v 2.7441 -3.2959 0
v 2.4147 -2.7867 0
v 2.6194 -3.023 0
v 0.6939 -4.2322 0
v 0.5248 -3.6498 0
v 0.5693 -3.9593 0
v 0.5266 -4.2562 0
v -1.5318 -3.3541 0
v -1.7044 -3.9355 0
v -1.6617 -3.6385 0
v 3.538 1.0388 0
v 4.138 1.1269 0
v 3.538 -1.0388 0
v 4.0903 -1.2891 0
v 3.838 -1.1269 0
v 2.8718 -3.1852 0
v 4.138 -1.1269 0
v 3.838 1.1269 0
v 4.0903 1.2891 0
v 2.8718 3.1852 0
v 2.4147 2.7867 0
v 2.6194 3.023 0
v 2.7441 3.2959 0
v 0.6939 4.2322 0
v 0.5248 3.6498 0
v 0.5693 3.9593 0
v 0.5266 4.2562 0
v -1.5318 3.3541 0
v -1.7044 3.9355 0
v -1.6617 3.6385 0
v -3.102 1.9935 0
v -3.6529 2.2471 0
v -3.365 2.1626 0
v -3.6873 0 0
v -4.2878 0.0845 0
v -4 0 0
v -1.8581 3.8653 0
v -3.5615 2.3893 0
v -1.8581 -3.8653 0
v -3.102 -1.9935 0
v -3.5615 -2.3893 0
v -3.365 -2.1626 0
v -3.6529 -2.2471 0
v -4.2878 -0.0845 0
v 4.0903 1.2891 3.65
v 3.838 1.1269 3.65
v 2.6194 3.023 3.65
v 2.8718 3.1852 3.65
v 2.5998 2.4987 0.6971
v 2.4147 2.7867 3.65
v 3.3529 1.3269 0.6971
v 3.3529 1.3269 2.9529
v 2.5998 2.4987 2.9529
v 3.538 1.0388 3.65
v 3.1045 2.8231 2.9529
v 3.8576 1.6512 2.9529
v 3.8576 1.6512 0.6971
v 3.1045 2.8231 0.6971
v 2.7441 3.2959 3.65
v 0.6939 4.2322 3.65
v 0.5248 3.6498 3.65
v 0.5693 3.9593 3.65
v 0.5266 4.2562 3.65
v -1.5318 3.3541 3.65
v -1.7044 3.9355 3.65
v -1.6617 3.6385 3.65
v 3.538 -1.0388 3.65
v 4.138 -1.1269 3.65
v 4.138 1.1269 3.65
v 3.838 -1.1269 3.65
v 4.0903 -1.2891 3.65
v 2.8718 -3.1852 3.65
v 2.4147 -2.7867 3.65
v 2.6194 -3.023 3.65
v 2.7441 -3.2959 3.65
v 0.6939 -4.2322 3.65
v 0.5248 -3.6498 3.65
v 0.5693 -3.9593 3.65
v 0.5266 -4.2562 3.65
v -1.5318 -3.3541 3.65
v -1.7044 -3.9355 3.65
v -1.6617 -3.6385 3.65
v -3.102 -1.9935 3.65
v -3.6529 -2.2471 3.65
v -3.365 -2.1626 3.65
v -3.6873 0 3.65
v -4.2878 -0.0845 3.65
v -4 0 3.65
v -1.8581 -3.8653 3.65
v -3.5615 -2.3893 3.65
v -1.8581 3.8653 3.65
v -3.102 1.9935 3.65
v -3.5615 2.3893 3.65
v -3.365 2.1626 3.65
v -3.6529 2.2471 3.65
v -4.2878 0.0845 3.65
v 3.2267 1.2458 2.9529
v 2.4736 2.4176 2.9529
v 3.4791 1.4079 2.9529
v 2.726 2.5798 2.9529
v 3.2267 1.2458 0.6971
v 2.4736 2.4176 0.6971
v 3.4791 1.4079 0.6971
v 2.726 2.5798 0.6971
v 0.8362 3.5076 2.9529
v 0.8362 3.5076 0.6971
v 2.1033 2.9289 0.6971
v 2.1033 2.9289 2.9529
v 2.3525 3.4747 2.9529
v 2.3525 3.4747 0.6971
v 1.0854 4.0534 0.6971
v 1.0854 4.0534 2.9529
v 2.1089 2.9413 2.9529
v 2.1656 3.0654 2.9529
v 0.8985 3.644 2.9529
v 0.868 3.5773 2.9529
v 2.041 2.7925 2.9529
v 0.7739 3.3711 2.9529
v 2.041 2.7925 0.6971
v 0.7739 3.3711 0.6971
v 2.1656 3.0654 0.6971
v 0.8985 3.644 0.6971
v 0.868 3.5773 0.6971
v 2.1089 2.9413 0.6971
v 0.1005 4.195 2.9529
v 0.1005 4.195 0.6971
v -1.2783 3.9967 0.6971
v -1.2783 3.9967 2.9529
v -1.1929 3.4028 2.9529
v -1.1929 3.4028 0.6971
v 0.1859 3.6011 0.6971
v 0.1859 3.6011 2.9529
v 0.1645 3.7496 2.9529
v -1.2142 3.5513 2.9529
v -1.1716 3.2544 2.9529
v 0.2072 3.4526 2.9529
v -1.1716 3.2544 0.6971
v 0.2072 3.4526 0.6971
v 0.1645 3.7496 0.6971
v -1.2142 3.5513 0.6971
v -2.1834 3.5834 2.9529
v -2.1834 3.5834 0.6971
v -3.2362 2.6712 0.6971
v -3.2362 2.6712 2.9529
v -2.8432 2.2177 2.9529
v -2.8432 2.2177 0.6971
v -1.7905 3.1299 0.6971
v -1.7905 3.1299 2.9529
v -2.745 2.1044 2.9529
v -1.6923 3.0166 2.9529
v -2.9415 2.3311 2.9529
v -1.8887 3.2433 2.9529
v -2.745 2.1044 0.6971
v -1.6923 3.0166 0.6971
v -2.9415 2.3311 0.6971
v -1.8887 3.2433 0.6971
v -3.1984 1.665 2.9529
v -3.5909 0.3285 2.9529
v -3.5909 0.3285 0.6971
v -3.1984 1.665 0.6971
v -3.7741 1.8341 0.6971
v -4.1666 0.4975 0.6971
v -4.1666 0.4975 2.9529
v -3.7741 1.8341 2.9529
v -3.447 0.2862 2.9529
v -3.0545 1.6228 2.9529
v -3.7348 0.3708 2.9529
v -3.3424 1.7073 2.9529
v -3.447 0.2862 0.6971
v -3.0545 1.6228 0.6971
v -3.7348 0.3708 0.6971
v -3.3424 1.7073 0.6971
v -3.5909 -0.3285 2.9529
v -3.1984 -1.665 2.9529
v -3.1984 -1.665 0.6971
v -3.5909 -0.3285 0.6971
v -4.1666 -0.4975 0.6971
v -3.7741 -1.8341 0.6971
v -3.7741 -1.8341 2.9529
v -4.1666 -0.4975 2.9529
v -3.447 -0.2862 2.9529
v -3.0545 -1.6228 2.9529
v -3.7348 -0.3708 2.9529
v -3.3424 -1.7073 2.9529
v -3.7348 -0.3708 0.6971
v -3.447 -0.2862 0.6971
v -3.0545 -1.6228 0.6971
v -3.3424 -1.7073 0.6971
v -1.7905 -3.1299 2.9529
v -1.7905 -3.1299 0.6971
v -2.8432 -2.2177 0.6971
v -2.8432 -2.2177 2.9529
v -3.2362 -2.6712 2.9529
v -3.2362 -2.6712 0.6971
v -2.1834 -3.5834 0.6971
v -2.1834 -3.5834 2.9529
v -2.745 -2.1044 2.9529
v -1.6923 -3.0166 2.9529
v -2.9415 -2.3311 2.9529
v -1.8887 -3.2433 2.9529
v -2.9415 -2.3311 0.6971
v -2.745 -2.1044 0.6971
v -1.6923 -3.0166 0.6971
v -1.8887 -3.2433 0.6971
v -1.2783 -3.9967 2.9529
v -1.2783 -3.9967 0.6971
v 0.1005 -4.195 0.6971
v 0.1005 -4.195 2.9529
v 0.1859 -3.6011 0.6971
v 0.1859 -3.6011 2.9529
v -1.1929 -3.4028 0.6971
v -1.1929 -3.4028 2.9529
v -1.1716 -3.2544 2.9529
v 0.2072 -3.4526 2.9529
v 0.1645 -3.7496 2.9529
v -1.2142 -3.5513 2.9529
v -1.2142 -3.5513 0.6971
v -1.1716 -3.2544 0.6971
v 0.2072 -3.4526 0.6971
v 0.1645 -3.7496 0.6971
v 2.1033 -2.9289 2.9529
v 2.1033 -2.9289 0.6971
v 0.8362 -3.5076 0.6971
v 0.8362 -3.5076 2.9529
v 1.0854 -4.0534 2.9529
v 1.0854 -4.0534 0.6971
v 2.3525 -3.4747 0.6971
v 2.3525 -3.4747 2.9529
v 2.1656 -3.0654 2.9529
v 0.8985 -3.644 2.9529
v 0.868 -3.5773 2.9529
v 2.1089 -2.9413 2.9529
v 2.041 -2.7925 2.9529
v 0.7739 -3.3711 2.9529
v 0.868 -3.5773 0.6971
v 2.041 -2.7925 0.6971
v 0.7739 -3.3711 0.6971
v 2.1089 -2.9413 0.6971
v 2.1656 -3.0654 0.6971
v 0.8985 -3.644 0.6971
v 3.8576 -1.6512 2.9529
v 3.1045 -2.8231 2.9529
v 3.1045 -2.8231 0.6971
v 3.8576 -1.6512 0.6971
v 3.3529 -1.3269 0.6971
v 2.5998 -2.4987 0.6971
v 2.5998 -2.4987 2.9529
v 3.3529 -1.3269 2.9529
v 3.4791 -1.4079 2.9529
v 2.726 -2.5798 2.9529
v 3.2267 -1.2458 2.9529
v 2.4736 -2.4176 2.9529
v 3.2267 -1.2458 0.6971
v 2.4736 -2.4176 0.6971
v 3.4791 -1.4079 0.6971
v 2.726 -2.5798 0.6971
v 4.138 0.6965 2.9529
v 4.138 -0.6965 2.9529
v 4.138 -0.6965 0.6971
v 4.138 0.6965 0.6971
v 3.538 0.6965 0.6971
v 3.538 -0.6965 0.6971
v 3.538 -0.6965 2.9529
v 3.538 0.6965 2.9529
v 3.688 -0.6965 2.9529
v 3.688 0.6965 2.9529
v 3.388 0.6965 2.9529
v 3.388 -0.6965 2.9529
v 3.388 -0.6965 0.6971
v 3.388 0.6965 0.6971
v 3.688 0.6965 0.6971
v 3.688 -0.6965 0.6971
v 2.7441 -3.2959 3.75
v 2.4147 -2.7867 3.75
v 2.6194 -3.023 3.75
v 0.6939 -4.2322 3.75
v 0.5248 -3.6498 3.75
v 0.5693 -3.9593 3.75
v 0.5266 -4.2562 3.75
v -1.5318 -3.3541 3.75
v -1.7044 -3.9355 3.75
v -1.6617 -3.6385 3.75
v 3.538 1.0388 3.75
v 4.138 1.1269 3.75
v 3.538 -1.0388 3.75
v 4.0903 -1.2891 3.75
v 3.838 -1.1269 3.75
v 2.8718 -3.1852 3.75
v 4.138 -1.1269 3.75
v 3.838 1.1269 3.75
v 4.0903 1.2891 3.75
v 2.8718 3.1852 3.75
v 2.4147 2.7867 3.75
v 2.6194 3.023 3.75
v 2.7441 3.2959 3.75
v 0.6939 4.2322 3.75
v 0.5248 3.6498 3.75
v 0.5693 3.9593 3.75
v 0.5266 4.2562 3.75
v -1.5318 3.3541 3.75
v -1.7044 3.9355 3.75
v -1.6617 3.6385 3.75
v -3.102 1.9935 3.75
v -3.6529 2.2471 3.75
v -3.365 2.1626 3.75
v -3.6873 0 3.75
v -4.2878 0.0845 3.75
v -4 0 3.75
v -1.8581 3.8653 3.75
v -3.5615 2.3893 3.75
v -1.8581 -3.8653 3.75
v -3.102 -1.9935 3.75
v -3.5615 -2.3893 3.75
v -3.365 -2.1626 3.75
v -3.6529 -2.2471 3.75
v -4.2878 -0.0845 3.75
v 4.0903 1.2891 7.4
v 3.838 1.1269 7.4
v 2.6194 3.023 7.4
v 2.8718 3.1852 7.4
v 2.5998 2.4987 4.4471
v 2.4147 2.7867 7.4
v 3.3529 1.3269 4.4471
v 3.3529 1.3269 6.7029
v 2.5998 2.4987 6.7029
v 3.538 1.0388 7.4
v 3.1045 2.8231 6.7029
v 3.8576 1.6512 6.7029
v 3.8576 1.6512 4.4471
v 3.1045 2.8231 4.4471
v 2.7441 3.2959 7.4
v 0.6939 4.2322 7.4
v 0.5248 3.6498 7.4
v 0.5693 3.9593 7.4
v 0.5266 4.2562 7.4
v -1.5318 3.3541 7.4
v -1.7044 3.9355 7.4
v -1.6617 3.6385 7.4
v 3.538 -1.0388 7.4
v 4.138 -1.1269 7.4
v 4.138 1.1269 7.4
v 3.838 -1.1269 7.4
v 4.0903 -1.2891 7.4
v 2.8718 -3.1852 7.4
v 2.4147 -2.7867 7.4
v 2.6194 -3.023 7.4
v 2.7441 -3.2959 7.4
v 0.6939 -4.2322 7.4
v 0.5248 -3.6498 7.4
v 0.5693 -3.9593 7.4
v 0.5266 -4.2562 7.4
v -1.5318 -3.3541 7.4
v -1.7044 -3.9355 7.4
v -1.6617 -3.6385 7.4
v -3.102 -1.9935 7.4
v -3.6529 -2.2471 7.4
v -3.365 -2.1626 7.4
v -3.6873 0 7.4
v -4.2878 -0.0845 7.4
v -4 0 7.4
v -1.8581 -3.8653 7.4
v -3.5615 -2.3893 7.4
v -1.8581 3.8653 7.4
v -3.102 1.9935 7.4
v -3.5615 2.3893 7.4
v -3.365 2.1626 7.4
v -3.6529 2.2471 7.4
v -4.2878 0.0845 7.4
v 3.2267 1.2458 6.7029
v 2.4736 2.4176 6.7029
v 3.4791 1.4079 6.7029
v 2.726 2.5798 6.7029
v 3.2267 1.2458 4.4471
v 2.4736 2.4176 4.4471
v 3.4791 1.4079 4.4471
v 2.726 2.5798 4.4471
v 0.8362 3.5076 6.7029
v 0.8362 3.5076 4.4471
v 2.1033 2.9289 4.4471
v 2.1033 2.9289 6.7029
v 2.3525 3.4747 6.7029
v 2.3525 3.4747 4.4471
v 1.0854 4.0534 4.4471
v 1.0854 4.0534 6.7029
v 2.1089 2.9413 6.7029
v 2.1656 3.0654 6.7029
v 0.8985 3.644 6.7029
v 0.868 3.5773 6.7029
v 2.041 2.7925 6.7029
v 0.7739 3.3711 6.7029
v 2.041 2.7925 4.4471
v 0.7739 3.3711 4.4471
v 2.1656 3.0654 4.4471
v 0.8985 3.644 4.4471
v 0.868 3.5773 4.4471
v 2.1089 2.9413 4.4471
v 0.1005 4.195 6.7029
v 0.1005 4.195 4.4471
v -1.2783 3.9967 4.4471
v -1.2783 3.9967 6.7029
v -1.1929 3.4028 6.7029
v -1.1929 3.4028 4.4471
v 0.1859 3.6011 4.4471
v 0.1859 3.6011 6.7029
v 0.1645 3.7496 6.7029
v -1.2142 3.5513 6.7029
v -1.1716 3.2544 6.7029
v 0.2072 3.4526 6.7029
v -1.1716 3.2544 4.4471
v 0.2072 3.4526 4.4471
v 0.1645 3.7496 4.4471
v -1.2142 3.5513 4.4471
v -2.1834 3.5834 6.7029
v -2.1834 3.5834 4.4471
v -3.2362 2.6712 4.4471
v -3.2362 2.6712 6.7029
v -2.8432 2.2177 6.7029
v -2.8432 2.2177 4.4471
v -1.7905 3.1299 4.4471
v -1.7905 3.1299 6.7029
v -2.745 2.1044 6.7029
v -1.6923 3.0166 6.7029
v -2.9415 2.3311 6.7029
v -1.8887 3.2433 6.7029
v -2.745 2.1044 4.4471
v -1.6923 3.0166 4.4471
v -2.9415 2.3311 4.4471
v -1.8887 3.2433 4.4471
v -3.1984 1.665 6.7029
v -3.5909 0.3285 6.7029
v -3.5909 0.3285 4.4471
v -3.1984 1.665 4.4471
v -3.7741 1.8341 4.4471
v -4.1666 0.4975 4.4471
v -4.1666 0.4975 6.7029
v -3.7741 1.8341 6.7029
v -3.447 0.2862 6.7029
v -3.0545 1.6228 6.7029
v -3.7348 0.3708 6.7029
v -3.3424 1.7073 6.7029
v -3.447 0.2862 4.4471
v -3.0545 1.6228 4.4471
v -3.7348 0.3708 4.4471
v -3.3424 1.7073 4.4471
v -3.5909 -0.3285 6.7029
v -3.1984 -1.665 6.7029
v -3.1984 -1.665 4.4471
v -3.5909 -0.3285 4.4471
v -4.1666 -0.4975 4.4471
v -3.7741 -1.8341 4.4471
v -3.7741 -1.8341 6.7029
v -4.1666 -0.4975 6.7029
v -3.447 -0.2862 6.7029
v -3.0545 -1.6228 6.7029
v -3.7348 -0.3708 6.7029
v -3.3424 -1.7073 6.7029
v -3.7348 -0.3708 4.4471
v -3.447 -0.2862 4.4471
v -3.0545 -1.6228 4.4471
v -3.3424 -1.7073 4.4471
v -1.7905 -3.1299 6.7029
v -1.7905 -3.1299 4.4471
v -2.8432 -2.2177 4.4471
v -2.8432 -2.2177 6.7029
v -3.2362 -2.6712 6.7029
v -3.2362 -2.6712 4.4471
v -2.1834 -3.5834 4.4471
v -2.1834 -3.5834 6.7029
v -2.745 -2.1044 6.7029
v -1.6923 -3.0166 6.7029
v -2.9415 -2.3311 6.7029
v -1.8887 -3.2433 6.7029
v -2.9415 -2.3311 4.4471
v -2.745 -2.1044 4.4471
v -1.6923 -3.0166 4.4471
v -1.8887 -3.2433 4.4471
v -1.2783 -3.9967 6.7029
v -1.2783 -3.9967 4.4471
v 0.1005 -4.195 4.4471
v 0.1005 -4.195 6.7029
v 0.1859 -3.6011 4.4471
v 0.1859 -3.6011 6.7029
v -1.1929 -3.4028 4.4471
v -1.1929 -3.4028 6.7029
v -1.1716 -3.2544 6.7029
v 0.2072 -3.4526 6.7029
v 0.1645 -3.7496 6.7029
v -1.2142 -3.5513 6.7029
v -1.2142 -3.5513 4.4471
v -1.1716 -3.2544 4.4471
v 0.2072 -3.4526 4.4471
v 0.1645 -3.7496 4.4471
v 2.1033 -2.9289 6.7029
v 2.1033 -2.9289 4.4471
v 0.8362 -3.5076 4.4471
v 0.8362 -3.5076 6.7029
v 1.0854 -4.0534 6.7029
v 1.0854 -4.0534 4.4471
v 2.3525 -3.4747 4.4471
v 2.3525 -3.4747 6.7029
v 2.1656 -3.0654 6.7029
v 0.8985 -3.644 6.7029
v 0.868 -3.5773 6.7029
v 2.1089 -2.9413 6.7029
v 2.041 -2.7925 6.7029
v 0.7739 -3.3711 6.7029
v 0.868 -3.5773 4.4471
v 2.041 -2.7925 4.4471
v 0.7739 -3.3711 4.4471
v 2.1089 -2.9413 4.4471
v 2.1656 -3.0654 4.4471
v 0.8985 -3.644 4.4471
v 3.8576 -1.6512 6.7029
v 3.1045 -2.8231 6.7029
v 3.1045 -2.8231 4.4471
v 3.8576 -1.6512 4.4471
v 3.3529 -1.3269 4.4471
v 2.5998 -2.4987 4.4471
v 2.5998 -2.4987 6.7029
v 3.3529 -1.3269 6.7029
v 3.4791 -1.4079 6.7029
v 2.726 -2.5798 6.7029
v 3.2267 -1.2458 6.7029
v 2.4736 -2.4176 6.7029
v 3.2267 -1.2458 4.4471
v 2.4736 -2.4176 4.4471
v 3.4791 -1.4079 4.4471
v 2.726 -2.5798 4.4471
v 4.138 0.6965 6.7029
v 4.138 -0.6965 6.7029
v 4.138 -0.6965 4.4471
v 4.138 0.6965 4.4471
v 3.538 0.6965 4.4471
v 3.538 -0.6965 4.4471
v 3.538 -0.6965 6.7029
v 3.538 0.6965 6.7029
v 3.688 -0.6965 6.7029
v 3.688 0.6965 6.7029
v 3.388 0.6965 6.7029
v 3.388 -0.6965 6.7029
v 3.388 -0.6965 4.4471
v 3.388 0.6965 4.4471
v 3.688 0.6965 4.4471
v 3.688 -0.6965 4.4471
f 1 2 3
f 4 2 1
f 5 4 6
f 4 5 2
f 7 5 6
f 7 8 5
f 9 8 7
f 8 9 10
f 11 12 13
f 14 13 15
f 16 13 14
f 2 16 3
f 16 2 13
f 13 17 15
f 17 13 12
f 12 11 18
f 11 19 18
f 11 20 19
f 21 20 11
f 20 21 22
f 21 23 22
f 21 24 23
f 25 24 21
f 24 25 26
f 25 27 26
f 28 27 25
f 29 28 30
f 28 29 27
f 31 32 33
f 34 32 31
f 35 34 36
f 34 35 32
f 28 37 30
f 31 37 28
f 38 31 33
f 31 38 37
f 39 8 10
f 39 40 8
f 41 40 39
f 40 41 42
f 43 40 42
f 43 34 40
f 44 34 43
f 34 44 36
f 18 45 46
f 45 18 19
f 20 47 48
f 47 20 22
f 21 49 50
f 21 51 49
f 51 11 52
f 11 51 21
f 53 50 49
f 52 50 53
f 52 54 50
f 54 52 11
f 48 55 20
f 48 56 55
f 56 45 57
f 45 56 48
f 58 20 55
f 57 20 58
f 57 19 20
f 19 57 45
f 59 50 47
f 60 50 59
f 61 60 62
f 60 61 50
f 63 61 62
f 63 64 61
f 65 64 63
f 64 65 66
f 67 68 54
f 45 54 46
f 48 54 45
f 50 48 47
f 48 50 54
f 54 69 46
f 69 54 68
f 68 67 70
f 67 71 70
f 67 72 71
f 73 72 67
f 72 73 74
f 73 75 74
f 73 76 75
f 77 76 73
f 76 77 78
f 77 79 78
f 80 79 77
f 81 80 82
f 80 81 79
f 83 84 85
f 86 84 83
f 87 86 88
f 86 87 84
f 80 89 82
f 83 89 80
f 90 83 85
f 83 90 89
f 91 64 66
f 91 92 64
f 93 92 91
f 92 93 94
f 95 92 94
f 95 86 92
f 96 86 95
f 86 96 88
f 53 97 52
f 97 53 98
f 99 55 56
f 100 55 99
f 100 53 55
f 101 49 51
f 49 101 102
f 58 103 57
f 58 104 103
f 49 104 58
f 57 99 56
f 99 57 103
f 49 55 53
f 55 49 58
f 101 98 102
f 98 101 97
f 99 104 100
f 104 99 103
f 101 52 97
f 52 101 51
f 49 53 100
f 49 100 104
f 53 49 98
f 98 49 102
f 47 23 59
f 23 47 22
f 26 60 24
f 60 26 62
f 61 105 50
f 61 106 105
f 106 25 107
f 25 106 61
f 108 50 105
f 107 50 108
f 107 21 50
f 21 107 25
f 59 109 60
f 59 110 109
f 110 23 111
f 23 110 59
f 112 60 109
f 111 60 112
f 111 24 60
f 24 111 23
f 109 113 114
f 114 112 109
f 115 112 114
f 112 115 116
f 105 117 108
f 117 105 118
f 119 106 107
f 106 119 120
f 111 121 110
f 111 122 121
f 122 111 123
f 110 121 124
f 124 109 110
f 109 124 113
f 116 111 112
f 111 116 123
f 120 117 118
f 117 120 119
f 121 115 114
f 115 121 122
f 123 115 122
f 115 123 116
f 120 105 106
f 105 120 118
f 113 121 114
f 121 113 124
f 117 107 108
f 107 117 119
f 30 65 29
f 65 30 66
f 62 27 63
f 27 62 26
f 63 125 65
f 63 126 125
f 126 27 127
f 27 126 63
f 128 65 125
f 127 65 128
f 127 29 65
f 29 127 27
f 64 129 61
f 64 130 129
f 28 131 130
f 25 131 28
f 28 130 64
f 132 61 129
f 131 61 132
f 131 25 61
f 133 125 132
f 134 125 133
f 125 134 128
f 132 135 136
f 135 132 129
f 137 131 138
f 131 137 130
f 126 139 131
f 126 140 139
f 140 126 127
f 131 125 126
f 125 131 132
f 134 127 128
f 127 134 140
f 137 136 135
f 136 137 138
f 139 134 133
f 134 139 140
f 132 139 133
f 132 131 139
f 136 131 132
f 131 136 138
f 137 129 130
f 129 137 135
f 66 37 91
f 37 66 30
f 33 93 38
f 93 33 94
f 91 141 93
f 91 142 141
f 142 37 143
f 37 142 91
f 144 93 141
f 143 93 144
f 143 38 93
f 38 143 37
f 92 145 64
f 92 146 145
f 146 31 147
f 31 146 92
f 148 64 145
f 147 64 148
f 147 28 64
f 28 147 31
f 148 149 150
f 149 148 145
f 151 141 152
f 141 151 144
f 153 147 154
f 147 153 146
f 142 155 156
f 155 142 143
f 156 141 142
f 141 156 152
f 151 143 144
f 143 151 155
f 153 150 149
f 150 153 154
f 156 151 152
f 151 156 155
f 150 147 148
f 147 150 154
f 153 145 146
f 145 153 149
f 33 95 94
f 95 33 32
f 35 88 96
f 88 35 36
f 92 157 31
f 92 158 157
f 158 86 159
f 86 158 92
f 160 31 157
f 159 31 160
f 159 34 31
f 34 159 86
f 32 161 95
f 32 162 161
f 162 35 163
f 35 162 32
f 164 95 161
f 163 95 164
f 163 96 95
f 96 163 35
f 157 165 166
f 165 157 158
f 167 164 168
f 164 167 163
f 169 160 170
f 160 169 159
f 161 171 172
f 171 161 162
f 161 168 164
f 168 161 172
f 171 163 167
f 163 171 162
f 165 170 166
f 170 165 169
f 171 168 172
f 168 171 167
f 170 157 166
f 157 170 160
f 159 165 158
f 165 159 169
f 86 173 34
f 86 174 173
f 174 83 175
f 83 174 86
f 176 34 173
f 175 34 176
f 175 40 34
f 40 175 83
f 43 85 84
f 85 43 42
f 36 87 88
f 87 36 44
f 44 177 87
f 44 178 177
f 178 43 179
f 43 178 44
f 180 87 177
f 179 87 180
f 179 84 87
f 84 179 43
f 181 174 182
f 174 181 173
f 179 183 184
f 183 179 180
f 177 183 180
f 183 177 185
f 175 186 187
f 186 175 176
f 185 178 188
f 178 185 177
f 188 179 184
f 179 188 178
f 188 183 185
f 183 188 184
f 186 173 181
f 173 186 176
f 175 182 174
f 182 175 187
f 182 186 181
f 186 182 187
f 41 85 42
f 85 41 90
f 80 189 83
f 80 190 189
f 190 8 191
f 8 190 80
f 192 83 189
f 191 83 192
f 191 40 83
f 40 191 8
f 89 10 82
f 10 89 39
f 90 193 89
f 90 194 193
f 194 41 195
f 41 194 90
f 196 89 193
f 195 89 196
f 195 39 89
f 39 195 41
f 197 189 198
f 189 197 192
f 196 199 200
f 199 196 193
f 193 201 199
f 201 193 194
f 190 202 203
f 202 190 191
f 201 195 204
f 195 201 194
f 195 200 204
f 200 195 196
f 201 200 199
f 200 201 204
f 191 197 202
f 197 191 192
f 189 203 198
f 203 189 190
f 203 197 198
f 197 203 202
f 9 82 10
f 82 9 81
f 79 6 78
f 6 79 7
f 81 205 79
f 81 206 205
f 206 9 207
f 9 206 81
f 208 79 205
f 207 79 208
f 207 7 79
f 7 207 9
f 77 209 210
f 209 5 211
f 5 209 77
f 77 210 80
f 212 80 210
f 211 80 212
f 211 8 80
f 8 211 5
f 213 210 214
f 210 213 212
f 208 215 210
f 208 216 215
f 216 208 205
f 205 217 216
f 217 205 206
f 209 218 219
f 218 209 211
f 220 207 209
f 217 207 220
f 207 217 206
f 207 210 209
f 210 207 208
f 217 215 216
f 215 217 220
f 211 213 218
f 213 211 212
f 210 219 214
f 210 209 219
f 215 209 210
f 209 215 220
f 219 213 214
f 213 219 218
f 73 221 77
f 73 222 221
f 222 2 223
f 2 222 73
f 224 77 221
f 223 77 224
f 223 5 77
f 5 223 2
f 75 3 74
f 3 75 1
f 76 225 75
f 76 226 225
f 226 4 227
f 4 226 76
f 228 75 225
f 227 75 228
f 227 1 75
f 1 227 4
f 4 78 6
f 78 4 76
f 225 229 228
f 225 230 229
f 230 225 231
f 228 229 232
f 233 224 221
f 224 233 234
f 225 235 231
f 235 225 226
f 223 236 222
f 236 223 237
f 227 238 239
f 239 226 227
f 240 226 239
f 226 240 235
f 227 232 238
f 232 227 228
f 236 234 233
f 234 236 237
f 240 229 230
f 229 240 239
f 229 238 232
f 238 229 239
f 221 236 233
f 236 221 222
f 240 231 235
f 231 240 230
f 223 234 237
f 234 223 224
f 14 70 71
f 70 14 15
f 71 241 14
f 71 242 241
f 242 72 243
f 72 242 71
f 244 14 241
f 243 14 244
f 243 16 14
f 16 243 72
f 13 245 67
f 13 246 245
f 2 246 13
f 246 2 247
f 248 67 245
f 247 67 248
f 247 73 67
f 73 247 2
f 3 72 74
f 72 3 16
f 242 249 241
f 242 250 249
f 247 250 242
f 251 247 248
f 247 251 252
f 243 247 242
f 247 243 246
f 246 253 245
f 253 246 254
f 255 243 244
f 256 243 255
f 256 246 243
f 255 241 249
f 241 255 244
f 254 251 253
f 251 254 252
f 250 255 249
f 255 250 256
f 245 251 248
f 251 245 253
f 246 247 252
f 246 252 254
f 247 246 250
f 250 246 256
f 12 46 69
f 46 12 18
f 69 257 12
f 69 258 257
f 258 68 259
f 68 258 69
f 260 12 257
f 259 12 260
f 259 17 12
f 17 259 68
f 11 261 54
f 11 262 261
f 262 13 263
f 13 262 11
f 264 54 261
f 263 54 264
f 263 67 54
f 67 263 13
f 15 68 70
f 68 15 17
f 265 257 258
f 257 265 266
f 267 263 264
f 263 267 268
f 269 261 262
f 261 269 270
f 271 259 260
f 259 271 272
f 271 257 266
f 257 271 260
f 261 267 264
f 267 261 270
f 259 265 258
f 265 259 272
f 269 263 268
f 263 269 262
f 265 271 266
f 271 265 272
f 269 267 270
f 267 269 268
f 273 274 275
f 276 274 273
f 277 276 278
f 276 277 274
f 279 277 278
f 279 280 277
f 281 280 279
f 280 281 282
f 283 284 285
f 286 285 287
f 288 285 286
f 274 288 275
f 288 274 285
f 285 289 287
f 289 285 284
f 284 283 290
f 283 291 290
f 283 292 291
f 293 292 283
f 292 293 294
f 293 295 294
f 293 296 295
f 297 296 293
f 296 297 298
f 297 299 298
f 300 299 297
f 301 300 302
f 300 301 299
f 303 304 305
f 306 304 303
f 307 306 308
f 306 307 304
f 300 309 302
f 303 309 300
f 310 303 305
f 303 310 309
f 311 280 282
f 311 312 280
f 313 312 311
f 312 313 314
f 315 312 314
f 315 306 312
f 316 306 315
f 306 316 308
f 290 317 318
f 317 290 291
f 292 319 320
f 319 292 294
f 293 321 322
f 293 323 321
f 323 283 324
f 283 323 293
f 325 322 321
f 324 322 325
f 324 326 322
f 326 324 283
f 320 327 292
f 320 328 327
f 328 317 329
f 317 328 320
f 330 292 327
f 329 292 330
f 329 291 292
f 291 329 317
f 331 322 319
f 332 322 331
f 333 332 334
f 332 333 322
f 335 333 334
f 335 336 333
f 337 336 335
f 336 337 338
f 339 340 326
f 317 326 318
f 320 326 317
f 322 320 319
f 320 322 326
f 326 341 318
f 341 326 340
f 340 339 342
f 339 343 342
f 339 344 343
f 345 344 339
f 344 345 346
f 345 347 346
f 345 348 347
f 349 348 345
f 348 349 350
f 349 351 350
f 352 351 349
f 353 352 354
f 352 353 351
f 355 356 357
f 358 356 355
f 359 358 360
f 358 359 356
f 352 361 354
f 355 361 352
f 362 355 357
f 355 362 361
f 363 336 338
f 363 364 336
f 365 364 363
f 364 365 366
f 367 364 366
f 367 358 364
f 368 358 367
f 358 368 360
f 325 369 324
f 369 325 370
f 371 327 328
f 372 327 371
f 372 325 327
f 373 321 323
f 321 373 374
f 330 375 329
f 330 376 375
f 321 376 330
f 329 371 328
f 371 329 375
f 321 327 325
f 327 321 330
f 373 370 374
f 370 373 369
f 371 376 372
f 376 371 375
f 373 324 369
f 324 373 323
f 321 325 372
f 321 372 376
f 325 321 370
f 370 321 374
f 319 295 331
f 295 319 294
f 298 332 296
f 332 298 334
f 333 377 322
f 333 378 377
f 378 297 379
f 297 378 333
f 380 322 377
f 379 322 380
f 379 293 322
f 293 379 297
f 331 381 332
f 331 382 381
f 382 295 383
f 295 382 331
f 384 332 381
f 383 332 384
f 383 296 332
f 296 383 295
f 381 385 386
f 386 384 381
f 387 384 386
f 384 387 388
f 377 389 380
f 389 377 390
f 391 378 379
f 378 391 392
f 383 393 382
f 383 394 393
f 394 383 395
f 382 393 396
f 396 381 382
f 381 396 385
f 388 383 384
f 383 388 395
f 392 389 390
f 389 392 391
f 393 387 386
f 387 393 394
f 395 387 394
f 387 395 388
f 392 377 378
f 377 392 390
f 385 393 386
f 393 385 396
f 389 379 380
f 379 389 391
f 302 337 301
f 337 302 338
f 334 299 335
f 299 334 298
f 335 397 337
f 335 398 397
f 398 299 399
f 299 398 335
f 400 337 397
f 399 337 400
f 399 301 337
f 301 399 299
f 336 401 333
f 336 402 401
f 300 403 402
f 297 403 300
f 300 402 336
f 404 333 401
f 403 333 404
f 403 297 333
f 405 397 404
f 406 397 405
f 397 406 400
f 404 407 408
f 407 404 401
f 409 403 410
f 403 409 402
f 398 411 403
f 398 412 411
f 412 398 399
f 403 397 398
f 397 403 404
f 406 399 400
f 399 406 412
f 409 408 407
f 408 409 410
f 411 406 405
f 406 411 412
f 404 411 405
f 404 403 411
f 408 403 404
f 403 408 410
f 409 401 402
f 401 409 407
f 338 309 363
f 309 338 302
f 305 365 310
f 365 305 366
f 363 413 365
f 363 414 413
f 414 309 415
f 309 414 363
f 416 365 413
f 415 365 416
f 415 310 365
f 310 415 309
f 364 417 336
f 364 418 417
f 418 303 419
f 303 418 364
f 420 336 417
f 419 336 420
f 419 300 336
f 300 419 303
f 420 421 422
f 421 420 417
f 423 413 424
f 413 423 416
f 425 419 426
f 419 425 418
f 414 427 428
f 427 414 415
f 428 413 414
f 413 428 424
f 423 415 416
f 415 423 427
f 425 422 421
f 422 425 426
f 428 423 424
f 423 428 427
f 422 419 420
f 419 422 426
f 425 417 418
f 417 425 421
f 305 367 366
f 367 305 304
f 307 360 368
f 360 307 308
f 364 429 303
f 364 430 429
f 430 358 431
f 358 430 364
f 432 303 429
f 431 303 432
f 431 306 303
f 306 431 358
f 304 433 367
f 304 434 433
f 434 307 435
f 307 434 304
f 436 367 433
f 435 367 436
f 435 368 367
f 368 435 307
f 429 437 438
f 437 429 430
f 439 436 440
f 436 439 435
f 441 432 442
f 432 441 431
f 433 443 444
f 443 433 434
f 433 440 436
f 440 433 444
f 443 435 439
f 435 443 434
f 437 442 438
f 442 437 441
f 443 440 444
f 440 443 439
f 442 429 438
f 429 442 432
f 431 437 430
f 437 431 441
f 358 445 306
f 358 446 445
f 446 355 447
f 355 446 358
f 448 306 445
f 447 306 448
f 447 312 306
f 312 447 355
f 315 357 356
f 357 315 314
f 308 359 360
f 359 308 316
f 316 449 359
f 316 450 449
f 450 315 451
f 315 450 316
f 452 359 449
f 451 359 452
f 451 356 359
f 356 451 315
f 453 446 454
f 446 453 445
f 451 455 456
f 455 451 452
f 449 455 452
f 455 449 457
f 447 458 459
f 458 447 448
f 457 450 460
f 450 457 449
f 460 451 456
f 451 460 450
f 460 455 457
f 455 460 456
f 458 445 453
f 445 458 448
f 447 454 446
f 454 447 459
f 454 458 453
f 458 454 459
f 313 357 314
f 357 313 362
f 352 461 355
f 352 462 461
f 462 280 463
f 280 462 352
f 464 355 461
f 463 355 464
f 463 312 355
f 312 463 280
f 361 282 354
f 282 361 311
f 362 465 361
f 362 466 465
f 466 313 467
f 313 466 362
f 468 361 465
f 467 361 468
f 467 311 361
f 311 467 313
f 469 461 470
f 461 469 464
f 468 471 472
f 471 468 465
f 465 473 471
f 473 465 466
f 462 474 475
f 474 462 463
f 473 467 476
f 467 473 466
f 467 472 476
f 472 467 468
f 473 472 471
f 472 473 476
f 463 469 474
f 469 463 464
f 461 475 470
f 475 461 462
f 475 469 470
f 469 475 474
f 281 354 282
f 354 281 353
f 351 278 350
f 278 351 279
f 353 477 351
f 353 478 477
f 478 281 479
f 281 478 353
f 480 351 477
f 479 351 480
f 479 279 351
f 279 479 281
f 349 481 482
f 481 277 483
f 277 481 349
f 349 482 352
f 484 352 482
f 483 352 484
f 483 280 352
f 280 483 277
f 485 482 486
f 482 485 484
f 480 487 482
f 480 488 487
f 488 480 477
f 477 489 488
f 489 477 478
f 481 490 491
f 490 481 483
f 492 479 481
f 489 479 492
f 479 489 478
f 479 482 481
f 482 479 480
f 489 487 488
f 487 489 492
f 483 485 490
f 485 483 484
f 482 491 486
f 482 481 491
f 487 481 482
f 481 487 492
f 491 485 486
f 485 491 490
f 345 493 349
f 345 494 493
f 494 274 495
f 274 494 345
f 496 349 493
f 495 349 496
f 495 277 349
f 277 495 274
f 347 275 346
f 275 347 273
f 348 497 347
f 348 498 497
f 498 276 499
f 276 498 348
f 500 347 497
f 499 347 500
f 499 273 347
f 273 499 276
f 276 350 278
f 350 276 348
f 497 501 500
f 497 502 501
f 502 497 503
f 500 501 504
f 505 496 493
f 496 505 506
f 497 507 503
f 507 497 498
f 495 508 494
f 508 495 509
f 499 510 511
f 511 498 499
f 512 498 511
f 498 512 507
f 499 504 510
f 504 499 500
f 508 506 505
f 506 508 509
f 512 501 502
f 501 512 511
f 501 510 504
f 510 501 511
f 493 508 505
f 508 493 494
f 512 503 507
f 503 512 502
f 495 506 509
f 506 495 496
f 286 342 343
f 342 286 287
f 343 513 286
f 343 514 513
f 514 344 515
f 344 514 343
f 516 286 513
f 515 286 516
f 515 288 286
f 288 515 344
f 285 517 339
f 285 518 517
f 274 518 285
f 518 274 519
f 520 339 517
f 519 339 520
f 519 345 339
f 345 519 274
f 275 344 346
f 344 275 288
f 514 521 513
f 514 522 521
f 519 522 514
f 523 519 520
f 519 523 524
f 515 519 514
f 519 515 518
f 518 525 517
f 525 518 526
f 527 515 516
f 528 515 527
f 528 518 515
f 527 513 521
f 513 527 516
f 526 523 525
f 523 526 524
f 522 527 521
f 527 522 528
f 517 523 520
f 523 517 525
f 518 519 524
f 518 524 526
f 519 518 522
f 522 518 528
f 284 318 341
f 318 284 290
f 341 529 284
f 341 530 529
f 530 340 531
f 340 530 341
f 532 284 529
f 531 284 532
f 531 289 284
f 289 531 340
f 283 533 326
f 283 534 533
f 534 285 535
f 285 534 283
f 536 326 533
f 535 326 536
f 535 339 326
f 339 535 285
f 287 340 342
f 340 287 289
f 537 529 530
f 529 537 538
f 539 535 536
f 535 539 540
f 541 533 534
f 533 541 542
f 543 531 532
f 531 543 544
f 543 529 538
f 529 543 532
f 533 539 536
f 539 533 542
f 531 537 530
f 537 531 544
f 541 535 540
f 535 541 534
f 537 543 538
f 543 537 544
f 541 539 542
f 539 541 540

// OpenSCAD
// file: lib/element.scad
// constants
gr = 1.61803; // golden ration

function inbetween(p1, p2, procent = 50) =
    let (x_diff = p2[0] - p1[0])
    let (y_diff = p2[1] - p1[1])
    [ p1[0] + x_diff*procent/100
    , p1[1] + y_diff*procent/100
    ];

function h(p2d, h) =
    [p2d[0], p2d[1], h];

// create a wall
module wall(p1, p2, h, thickness = 300) {
    let (x_diff = p2[0] - p1[0])
    let (y_diff = p2[1] - p1[1])
    let (len = sqrt(pow(x_diff, 2) +
                    pow(y_diff, 2)))
    if (h != 0)
    {
        linear_extrude(height = h)
        translate(p1)
        rotate(atan2(y_diff, x_diff))
        translate([0, -thickness/2])
        square([len, thickness]);
    }
    else
    {
        translate(p1)
        rotate(atan2(y_diff, x_diff))
        translate([0, -thickness/2])
        square([len, thickness]);
    }
}

// create a wall with two different heights
module wall2(p1, p2, h1, h2, thickness = 0.5) {
    let (x_diff = p2[0] - p1[0])
    let (y_diff = p2[1] - p1[1])
    let (len = sqrt(pow(x_diff, 2) +
                    pow(y_diff, 2)))
    if ((h1 == 0)&&(h2 == 0))
    {
        wall(p1, p2, 0, thickness);
    }
    else
    {
        translate(p1)
        rotate(atan2(y_diff, x_diff))
        rotate([90, 0, 0])
        linear_extrude(height = thickness, center = true)
        polygon(points=[[0,0],[len,0],[len,h2],[0,h1]]);
    }
}

module window(p1, p2, pos, height, sizex, sizey, wt = 300) {
    assert(0 < pos && pos < 100);
    x_diff = p2[0] - p1[0];
    y_diff = p2[1] - p1[1];
    len = sqrt(pow(x_diff, 2) +
               pow(y_diff, 2));
    difference () {
        children();
        // create the hole for the window
        translate([0,0,height])
        translate(p1 + pos*[x_diff, y_diff]/100)
        rotate(atan2(y_diff, x_diff) + 90, [0,0,1])
        cube([4*wt, sizex, sizey], center = true);
    }
    // add the glass to the window
    color_glass()
    translate([0,0,height])
    translate(p1 + pos*[x_diff, y_diff]/100)
    rotate(atan2(y_diff, x_diff) + 90, [0,0,1])
    translate([wt/2, 0, 0])
    cube([wt/2, sizex, sizey], center = true);
}

module plane(p1, p2, p3, p4, th = 0.000002) {
    v1 = [ p2[0] - p1[0]
         , p2[1] - p1[1]
         , p2[2] - p1[2]
         ];
    v2 = [ p2[0] - p3[0]
         , p2[1] - p3[1]
         , p2[2] - p3[2]
         ];
    hull()
        for(p=[p1, p2, p3, p4])
            translate(p) cube(th, true);
}

module beam(p1, p2, r = 0.4) {
    vector = [ p2[0] - p1[0]
             , p2[1] - p1[1]
             , p2[2] - p1[2]
             ];
    distance = norm(vector);
    translate(vector/2 + p1)
    rotate([0, 0, atan2(vector[1], vector[0])]) // rotationXY
    rotate([0, atan2(sqrt(pow(vector[0], 2) + pow(vector[1], 2)), vector[2]), 0]) // rotationZX
    cylinder(h = distance, r = r, $fn = 20, center = true);
}

module plinth(p, s, h) {
    translate([p[0], p[1], h/2])
    cube([s, s, h], center = true);
}

module color_lawn() {
    color("LawnGreen")
    children();
}

module color_outer_wall() {
    color("MediumSpringGreen")
    children();
}

module color_inner_wall() {
    color("Ivory")
    children();
}

module color_roof() {
    color("Lavender")
    children();
}

module color_floor() {
    color("Wheat")
    children();
}

module color_logs() {
    color("Ivory")
    children();
}

module color_glass() {
    color("azure", 0.50)
    children();
}

module color_concrete() {
    color("lightgrey")
    children();
}

// Regular polygons

// calculate the coordinates for the corners
function point(i, r, corners) =
   let (vz = 360/corners/2)
   let (angle=i*(360/corners) - vz)
   [ r*cos(angle)
   , r*sin(angle)
   ];

module octagon(r, h, corners) {
    coords=[for (i = [0:corners-1]) point(i, r, corners)];
    linear_extrude(height = h)
    polygon(coords);
}

module octawalls(r, h, wt, corners) {
    difference () {
        octagon(r, h, corners);
        translate([0, 0, -wt])
        octagon(r - wt, h + 2*wt, corners);
    }
}
// main file
use <lib/element.scad>

// constants
gr = 1.61803; // golden ration

// configure the house
floors = 2;
wt =   0.6;  // wall thickness
corners = 11; // number of house corners
mrr = 4;     // house radius
fh = 3.65;     // floor height

// calculate the coordinates for the corners
function p(i, r) = point(i, r, corners);

// create a wall of thickness wt
module w(p1, p2, h) {
    wall(p1, p2, h, wt);
}

module wi(p1, p2, pos, height, sizex, sizey) {
    window(p1, p2, pos, height, sizex, sizey, wt)
    children();
}

module floor(f_height, w_width, w_height) {
    for (i = [1:corners])
        let (p1 = p(i, mrr))
        let (p2 = p(i+1, mrr))
        wi(p1, p2, 50, f_height/2, w_width, w_height)
        w(p1, p2, f_height);
}

// calculate constants
p1 = p(0, mrr);
p2 = p(1, mrr);
w1 = norm(p1 - p2);
h1 = fh;
d1 = sqrt(w1^2 + h1^2);
ww = sqrt(d1^2 - h1^2)/gr;
wh = sqrt(d1^2 - w1^2)/gr;
ratio = max(ww, wh)/min(ww, wh);
echo ("ratio =", ratio);
echo ("ratio in % to GR = ", 100*(ratio - gr)/gr);

// draw the house
for (i = [0:floors-1])
    translate([0, 0, i*(fh + 0.1)])
    floor(fh, ww, wh);
